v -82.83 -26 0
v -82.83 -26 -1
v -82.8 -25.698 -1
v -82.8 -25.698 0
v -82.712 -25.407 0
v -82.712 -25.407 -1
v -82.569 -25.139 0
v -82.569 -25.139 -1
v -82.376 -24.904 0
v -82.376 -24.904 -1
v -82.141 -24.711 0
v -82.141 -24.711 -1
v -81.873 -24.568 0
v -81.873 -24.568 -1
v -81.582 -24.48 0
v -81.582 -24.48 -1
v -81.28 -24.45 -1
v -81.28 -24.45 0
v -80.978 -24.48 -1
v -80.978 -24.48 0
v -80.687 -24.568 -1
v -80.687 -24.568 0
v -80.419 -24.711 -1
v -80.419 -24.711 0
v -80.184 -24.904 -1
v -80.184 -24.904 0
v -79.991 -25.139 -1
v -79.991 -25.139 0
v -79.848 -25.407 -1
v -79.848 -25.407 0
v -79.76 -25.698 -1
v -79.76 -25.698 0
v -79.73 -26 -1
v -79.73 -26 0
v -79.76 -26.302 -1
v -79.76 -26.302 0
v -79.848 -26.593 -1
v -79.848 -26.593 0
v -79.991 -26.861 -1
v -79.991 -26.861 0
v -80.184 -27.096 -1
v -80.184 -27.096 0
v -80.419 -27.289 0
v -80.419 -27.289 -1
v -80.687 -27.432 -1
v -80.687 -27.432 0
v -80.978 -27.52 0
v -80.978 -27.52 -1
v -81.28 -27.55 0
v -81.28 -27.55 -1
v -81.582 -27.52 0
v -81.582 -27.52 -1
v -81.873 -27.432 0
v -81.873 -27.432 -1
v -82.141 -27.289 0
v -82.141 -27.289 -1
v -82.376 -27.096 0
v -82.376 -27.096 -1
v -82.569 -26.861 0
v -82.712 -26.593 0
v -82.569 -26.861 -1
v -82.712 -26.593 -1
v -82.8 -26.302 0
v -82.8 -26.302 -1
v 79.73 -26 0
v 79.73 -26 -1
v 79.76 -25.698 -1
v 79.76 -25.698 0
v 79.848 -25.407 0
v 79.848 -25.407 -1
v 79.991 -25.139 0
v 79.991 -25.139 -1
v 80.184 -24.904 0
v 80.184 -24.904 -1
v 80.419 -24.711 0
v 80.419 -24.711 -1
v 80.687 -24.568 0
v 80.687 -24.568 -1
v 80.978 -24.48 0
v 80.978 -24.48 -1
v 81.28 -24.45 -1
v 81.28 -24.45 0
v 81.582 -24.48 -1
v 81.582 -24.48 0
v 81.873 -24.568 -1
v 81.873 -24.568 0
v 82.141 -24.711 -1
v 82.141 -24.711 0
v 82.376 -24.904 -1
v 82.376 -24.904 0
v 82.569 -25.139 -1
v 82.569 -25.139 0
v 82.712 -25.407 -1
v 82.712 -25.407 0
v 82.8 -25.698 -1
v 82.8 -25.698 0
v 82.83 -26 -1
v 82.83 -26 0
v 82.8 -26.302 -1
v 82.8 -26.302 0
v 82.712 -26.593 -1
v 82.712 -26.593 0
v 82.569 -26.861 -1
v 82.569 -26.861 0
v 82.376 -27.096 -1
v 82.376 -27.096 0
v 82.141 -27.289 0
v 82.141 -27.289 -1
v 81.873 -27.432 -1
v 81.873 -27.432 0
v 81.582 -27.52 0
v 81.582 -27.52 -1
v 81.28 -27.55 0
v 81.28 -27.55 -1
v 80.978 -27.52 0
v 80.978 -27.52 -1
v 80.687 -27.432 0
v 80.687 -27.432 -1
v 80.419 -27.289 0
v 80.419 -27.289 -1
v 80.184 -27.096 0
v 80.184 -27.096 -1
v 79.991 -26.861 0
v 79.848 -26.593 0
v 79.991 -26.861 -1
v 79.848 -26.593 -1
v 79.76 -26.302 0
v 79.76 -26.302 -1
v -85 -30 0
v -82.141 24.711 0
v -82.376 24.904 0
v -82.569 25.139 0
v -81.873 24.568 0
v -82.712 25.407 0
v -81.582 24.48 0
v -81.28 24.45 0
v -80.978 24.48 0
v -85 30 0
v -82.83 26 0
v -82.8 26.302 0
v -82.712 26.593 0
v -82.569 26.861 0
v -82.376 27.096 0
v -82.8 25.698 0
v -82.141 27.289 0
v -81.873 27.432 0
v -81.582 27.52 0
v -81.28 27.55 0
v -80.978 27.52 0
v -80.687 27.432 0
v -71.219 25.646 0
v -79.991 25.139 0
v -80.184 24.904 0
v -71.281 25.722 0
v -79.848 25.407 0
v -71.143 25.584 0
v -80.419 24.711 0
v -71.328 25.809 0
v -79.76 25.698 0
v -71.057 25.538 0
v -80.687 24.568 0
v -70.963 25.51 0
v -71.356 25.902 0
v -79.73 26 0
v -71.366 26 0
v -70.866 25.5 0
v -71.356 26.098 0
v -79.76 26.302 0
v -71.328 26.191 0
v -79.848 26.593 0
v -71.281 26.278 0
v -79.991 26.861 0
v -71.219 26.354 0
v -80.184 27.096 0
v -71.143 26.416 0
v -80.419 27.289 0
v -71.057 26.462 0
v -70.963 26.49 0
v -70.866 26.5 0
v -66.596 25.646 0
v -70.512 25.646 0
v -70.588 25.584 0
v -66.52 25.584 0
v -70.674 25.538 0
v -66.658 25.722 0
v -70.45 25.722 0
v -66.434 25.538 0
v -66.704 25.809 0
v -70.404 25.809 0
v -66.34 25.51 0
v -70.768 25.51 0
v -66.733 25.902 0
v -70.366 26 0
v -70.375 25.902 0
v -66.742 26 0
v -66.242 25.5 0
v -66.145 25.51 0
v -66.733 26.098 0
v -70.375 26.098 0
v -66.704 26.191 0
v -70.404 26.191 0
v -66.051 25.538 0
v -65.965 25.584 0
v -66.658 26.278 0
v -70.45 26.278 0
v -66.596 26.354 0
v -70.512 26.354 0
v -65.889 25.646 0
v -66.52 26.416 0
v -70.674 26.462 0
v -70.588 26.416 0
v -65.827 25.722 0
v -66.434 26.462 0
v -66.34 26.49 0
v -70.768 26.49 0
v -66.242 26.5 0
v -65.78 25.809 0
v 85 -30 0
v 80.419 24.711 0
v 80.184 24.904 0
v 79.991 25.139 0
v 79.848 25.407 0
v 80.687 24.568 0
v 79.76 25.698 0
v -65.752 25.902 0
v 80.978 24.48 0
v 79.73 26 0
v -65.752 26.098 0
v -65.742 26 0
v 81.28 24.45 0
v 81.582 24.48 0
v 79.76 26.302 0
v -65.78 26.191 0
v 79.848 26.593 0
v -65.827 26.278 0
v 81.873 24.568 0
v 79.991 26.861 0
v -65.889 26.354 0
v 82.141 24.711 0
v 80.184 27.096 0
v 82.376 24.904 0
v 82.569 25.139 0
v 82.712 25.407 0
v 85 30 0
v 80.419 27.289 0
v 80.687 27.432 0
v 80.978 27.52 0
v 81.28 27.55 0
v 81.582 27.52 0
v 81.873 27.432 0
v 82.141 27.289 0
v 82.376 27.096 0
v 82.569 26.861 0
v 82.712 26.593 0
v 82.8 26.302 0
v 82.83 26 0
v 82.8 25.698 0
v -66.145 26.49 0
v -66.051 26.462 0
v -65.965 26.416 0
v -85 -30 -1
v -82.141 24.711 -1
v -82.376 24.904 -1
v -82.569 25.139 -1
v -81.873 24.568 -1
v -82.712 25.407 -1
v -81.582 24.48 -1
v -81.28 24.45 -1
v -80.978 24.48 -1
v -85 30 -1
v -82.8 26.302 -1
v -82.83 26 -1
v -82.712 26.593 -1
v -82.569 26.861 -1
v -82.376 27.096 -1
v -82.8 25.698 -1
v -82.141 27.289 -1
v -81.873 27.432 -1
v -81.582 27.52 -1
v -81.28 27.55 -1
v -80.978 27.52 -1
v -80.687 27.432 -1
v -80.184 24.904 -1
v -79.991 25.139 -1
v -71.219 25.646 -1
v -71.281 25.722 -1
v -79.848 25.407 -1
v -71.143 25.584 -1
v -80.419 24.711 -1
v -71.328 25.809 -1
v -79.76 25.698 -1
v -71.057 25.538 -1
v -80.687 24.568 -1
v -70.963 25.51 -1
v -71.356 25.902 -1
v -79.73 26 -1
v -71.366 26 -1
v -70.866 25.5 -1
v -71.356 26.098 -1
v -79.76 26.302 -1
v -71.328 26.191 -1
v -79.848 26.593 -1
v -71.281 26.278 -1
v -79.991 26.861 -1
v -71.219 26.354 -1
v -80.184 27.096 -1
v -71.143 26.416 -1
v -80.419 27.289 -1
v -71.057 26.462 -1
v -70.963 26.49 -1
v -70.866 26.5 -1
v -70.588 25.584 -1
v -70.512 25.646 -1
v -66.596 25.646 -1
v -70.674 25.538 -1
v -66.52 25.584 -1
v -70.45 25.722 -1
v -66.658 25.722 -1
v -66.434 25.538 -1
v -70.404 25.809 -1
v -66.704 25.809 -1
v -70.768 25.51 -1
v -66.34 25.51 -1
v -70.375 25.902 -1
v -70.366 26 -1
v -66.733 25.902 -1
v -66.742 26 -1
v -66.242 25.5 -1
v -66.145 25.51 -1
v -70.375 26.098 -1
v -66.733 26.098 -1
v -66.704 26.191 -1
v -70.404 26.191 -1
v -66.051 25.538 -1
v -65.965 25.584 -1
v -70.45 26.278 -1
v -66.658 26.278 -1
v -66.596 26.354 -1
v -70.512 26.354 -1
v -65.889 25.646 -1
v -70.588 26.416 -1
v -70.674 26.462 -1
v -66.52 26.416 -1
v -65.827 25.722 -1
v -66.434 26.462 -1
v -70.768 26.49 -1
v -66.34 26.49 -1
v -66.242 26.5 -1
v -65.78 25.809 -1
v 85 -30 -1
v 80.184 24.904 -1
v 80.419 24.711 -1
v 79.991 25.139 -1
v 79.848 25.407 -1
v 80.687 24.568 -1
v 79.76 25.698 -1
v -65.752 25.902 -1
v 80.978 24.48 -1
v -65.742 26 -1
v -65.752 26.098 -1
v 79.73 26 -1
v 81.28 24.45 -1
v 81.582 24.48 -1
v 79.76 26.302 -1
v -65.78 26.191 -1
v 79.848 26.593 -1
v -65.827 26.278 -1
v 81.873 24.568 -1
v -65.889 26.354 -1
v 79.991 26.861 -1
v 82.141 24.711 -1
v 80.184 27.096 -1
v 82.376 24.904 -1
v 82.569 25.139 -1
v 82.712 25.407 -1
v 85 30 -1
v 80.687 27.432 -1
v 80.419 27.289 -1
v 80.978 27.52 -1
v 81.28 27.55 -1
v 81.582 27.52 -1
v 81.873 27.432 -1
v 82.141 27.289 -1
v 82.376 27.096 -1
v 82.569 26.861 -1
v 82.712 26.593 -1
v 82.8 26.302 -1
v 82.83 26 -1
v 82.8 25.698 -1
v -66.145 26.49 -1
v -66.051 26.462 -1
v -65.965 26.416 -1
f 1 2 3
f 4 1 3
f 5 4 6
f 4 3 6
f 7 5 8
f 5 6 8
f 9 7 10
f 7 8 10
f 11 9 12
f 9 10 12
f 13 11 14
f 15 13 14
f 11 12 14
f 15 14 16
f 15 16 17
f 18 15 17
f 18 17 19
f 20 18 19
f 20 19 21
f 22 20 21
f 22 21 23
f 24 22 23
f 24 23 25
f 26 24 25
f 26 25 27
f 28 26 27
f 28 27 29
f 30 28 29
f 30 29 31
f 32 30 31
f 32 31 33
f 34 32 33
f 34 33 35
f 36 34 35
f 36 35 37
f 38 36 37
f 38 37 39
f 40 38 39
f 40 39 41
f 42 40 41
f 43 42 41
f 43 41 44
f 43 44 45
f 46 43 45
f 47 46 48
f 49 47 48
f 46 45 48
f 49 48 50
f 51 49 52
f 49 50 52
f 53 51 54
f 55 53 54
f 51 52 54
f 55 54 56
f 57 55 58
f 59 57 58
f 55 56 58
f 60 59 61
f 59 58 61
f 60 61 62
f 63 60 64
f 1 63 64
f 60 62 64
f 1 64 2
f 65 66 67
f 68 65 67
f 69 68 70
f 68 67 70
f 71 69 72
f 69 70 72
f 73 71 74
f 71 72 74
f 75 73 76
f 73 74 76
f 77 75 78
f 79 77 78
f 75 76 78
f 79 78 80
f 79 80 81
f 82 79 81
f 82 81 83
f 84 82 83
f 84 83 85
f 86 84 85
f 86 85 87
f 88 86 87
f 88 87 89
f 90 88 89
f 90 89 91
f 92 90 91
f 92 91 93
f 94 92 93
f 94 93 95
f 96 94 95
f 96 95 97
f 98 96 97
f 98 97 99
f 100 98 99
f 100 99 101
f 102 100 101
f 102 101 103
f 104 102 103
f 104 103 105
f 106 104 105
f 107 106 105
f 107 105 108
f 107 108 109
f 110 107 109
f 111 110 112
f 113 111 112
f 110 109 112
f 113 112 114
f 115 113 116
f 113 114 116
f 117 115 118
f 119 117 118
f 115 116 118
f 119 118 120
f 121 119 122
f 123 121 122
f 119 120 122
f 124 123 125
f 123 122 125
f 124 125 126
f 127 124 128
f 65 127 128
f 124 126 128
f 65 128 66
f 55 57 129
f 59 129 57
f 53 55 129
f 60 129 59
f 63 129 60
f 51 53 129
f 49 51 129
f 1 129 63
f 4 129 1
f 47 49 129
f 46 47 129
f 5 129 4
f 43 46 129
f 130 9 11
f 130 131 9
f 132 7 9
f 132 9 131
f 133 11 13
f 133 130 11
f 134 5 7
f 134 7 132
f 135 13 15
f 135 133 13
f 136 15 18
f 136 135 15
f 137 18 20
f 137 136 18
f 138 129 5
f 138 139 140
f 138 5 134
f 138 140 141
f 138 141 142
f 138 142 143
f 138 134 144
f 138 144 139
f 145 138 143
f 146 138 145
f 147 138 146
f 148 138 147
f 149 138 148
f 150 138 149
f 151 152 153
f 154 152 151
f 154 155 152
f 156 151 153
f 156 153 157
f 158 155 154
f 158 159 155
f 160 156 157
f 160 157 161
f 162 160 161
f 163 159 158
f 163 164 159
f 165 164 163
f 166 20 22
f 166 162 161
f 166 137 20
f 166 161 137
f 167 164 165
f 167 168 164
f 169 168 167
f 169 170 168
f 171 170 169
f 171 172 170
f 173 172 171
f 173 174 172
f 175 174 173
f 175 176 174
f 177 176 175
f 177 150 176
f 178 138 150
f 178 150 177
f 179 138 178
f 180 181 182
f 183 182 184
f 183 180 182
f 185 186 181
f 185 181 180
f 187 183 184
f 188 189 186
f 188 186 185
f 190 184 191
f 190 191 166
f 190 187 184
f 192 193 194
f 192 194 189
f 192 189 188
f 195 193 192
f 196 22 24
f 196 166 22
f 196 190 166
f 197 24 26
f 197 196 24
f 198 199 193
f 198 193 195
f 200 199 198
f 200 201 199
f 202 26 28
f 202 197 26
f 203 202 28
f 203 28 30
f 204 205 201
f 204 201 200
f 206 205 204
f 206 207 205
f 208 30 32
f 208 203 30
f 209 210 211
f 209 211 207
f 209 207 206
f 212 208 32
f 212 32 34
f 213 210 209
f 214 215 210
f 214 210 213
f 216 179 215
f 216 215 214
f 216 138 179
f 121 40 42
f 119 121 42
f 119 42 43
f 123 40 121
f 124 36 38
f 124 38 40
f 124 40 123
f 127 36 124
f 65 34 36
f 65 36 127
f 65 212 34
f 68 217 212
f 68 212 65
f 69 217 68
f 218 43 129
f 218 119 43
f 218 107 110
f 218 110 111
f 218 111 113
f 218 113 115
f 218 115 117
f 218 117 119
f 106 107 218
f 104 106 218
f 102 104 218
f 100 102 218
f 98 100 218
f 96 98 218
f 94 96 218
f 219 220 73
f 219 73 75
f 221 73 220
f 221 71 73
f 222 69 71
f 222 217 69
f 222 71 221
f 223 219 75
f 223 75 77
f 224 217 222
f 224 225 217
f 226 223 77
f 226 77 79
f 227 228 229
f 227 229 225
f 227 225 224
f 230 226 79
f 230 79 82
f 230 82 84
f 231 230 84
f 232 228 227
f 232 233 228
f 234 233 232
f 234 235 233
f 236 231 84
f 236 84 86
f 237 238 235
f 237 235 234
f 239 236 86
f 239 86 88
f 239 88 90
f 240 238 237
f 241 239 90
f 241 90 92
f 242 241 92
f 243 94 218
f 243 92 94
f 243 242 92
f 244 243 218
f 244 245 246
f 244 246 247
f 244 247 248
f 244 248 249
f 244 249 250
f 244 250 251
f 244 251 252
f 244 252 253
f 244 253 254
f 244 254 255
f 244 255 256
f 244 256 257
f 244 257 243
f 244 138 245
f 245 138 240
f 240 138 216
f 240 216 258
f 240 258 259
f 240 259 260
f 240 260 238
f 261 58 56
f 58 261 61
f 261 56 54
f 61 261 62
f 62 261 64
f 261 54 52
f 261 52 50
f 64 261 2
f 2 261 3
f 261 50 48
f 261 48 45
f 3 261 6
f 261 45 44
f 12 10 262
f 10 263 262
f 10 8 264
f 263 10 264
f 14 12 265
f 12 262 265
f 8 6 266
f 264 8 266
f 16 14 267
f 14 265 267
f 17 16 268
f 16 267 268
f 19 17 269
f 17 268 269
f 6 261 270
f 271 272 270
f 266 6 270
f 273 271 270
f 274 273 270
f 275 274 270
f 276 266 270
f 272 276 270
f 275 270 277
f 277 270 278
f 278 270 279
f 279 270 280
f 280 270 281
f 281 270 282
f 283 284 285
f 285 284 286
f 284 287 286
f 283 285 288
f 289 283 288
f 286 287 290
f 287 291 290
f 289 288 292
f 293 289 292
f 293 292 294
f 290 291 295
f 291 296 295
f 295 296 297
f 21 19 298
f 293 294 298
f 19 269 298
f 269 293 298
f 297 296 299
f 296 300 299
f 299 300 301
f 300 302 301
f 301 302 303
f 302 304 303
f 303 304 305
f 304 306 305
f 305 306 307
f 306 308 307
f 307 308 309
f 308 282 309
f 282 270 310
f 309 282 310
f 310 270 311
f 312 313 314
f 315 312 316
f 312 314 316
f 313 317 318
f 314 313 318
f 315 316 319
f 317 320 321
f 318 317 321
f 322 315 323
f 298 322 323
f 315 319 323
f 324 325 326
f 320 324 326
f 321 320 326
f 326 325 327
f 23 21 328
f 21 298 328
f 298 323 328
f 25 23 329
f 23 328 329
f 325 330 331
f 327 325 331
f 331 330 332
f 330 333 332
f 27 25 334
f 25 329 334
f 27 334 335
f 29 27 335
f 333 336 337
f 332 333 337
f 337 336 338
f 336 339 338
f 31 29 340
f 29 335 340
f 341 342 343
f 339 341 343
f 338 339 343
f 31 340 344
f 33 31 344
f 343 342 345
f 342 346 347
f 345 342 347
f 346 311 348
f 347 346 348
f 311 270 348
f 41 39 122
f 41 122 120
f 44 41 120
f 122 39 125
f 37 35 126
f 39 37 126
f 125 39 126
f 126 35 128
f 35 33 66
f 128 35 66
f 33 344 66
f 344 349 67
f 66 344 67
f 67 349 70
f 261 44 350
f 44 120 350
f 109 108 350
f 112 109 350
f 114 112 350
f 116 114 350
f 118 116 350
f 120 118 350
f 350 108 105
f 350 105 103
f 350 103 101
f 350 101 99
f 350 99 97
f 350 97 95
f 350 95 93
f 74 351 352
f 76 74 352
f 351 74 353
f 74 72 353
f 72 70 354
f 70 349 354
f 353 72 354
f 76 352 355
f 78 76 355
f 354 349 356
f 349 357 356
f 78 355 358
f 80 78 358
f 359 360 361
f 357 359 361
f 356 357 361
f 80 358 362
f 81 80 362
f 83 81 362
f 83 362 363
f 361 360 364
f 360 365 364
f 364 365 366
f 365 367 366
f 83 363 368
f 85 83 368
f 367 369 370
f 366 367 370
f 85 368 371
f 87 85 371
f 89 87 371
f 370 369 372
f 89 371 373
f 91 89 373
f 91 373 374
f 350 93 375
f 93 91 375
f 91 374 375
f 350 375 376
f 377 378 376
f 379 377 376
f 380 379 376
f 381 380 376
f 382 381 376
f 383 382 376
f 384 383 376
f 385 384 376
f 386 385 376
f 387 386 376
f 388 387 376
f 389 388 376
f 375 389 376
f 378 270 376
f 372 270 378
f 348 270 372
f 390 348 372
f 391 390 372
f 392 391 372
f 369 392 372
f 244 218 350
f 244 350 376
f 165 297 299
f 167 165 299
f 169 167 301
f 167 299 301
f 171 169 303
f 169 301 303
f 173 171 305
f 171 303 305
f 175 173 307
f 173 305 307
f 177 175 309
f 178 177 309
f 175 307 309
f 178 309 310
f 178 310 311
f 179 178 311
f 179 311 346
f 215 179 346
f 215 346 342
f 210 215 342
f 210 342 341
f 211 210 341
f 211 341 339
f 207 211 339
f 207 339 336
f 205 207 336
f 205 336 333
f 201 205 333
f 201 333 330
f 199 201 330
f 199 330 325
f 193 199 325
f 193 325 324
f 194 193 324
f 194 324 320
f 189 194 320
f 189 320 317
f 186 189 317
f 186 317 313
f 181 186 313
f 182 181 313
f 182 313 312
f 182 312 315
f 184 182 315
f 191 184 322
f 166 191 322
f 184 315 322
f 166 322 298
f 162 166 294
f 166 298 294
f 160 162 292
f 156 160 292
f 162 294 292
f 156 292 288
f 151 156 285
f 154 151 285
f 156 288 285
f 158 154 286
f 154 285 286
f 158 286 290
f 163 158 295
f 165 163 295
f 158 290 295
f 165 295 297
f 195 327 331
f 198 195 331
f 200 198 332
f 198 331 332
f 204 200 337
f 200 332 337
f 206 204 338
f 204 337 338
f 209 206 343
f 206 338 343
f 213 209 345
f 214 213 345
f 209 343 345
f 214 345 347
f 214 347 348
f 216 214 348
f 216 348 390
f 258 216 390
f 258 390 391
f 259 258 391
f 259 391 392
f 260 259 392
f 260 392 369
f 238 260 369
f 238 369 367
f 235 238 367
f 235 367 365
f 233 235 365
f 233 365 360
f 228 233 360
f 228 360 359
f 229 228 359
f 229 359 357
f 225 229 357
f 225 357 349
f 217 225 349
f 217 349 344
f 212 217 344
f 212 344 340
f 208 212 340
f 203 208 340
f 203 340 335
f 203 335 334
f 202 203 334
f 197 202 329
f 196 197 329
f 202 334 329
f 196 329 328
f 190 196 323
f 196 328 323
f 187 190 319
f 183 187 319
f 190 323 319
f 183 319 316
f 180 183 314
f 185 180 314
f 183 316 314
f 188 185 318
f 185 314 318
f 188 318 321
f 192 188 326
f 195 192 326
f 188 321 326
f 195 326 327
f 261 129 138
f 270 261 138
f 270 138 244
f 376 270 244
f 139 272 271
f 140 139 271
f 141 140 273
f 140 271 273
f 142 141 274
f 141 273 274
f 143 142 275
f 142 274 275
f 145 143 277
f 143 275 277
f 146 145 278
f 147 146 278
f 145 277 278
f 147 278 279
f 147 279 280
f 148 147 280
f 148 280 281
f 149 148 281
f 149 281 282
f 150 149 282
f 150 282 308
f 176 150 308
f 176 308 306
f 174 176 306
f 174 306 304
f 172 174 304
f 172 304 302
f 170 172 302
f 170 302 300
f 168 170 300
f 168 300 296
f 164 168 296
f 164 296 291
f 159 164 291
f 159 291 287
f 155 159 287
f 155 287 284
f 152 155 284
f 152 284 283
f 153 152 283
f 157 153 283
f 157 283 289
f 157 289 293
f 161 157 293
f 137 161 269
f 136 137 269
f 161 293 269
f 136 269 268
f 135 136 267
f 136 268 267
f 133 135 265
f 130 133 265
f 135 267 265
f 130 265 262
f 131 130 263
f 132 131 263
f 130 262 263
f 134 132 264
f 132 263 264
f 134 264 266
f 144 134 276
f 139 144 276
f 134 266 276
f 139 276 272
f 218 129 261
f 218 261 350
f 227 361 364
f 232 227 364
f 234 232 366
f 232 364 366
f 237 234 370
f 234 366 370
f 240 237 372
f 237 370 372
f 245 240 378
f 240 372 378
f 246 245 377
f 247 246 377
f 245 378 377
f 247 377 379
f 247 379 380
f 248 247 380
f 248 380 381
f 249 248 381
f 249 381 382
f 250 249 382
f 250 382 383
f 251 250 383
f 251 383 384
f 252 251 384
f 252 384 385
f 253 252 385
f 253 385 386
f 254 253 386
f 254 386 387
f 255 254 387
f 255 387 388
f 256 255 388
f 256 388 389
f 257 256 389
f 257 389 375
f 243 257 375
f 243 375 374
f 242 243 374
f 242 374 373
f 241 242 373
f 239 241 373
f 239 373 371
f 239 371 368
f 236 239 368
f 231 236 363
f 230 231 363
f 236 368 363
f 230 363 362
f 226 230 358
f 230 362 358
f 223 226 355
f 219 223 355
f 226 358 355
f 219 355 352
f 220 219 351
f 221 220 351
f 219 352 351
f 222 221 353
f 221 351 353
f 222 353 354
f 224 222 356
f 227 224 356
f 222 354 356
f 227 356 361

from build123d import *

# Parameters (mm, degrees)
F0_W     = 170
F0_H     = 60
F1_DEPTH = 1
F2_D     = 3.1
F3_D     = 1


with BuildPart() as f1:
    # F0 (on Top) → F1 (new body)
    with BuildSketch(Plane.XY):
        Rectangle(F0_W, F0_H)
    extrude(amount=-F1_DEPTH)

    # F2 (through all)
    with Locations(Plane.XY):
        with Locations((-81.28, 26), (-81.28, -26), (81.28, 26), (81.28, -26)):
            Hole(F2_D / 2)

    # F3 (through all)
    with Locations(Plane.XY):
        with Locations((-70.865646, 26), (-66.242307, 26)):
            Hole(F3_D / 2)


solid = f1.part
